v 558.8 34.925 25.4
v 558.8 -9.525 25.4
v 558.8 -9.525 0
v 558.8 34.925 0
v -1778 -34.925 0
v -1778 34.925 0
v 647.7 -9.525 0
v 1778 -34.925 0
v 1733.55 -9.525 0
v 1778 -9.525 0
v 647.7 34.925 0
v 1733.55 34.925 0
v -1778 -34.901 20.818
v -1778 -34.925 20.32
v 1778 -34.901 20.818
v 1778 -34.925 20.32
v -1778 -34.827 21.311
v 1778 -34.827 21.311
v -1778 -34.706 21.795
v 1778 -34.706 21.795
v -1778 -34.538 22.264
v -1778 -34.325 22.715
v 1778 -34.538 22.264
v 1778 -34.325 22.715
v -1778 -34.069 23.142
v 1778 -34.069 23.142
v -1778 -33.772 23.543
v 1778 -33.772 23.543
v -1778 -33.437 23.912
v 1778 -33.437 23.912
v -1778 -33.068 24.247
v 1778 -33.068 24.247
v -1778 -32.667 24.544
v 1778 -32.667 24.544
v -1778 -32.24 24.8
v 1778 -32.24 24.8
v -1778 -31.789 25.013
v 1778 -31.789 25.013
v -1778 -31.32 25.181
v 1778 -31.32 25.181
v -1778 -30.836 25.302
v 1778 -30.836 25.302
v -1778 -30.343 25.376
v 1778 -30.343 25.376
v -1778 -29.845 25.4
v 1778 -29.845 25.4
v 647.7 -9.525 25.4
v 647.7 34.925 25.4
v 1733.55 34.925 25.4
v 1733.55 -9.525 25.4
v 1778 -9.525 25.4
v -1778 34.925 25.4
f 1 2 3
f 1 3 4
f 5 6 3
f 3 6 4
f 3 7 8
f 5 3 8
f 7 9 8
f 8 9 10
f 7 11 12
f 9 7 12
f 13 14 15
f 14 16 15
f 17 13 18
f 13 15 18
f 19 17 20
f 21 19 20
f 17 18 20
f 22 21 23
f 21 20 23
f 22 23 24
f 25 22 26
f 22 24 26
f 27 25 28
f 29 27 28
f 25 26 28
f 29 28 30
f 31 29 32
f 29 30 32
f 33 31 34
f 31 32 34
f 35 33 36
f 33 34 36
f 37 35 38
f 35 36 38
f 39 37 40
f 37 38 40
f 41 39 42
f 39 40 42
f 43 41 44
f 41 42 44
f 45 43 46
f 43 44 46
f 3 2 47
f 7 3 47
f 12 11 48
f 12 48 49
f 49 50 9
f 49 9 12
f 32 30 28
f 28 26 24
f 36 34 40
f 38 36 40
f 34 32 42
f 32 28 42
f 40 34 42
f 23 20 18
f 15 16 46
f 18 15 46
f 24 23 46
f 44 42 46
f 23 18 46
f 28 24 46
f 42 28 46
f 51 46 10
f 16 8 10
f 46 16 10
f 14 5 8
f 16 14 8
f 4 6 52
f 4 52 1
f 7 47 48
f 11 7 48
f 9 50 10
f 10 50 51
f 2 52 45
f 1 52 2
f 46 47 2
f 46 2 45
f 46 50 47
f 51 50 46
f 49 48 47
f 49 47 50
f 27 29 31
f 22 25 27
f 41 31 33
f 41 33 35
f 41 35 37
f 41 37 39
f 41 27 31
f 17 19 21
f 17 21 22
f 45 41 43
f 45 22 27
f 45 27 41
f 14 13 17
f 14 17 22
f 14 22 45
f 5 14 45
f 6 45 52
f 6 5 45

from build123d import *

# Parameters (mm, degrees)
F0_W     = 3556
F0_H     = 69.85
F1_DEPTH = 25.4
F2_W     = 44.45
F2_H     = 44.45
F3_DEPTH = 25.401
F4_W     = 88.9
F4_H     = 44.45
F5_DEPTH = 25.401
F6_R     = 5.08


with BuildPart() as f1:
    # F0 (on Top) → F1 (new body)
    with BuildSketch(Plane.XY):
        Rectangle(F0_W, F0_H)
    extrude(amount=F1_DEPTH)

    # F2 (on face) → F3 (cut, through all)
    with BuildSketch(Plane.XY.offset(25.4)):
        with Locations((1755.775, 12.7)):
            Rectangle(F2_W, F2_H)
    extrude(amount=-F3_DEPTH, mode=Mode.SUBTRACT)

    # F4 (on face) → F5 (cut, through all)
    with BuildSketch(Plane.XY.offset(25.4)):
        with Locations((603.25, 12.7)):
            Rectangle(F4_W, F4_H)
    extrude(amount=-F5_DEPTH, mode=Mode.SUBTRACT)

    # F6
    f6_edges = [f1.edges().sort_by_distance(p)[0] for p in [
        (0, -34.925, 25.4),
    ]]
    fillet(f6_edges, radius=F6_R)


solid = f1.part
